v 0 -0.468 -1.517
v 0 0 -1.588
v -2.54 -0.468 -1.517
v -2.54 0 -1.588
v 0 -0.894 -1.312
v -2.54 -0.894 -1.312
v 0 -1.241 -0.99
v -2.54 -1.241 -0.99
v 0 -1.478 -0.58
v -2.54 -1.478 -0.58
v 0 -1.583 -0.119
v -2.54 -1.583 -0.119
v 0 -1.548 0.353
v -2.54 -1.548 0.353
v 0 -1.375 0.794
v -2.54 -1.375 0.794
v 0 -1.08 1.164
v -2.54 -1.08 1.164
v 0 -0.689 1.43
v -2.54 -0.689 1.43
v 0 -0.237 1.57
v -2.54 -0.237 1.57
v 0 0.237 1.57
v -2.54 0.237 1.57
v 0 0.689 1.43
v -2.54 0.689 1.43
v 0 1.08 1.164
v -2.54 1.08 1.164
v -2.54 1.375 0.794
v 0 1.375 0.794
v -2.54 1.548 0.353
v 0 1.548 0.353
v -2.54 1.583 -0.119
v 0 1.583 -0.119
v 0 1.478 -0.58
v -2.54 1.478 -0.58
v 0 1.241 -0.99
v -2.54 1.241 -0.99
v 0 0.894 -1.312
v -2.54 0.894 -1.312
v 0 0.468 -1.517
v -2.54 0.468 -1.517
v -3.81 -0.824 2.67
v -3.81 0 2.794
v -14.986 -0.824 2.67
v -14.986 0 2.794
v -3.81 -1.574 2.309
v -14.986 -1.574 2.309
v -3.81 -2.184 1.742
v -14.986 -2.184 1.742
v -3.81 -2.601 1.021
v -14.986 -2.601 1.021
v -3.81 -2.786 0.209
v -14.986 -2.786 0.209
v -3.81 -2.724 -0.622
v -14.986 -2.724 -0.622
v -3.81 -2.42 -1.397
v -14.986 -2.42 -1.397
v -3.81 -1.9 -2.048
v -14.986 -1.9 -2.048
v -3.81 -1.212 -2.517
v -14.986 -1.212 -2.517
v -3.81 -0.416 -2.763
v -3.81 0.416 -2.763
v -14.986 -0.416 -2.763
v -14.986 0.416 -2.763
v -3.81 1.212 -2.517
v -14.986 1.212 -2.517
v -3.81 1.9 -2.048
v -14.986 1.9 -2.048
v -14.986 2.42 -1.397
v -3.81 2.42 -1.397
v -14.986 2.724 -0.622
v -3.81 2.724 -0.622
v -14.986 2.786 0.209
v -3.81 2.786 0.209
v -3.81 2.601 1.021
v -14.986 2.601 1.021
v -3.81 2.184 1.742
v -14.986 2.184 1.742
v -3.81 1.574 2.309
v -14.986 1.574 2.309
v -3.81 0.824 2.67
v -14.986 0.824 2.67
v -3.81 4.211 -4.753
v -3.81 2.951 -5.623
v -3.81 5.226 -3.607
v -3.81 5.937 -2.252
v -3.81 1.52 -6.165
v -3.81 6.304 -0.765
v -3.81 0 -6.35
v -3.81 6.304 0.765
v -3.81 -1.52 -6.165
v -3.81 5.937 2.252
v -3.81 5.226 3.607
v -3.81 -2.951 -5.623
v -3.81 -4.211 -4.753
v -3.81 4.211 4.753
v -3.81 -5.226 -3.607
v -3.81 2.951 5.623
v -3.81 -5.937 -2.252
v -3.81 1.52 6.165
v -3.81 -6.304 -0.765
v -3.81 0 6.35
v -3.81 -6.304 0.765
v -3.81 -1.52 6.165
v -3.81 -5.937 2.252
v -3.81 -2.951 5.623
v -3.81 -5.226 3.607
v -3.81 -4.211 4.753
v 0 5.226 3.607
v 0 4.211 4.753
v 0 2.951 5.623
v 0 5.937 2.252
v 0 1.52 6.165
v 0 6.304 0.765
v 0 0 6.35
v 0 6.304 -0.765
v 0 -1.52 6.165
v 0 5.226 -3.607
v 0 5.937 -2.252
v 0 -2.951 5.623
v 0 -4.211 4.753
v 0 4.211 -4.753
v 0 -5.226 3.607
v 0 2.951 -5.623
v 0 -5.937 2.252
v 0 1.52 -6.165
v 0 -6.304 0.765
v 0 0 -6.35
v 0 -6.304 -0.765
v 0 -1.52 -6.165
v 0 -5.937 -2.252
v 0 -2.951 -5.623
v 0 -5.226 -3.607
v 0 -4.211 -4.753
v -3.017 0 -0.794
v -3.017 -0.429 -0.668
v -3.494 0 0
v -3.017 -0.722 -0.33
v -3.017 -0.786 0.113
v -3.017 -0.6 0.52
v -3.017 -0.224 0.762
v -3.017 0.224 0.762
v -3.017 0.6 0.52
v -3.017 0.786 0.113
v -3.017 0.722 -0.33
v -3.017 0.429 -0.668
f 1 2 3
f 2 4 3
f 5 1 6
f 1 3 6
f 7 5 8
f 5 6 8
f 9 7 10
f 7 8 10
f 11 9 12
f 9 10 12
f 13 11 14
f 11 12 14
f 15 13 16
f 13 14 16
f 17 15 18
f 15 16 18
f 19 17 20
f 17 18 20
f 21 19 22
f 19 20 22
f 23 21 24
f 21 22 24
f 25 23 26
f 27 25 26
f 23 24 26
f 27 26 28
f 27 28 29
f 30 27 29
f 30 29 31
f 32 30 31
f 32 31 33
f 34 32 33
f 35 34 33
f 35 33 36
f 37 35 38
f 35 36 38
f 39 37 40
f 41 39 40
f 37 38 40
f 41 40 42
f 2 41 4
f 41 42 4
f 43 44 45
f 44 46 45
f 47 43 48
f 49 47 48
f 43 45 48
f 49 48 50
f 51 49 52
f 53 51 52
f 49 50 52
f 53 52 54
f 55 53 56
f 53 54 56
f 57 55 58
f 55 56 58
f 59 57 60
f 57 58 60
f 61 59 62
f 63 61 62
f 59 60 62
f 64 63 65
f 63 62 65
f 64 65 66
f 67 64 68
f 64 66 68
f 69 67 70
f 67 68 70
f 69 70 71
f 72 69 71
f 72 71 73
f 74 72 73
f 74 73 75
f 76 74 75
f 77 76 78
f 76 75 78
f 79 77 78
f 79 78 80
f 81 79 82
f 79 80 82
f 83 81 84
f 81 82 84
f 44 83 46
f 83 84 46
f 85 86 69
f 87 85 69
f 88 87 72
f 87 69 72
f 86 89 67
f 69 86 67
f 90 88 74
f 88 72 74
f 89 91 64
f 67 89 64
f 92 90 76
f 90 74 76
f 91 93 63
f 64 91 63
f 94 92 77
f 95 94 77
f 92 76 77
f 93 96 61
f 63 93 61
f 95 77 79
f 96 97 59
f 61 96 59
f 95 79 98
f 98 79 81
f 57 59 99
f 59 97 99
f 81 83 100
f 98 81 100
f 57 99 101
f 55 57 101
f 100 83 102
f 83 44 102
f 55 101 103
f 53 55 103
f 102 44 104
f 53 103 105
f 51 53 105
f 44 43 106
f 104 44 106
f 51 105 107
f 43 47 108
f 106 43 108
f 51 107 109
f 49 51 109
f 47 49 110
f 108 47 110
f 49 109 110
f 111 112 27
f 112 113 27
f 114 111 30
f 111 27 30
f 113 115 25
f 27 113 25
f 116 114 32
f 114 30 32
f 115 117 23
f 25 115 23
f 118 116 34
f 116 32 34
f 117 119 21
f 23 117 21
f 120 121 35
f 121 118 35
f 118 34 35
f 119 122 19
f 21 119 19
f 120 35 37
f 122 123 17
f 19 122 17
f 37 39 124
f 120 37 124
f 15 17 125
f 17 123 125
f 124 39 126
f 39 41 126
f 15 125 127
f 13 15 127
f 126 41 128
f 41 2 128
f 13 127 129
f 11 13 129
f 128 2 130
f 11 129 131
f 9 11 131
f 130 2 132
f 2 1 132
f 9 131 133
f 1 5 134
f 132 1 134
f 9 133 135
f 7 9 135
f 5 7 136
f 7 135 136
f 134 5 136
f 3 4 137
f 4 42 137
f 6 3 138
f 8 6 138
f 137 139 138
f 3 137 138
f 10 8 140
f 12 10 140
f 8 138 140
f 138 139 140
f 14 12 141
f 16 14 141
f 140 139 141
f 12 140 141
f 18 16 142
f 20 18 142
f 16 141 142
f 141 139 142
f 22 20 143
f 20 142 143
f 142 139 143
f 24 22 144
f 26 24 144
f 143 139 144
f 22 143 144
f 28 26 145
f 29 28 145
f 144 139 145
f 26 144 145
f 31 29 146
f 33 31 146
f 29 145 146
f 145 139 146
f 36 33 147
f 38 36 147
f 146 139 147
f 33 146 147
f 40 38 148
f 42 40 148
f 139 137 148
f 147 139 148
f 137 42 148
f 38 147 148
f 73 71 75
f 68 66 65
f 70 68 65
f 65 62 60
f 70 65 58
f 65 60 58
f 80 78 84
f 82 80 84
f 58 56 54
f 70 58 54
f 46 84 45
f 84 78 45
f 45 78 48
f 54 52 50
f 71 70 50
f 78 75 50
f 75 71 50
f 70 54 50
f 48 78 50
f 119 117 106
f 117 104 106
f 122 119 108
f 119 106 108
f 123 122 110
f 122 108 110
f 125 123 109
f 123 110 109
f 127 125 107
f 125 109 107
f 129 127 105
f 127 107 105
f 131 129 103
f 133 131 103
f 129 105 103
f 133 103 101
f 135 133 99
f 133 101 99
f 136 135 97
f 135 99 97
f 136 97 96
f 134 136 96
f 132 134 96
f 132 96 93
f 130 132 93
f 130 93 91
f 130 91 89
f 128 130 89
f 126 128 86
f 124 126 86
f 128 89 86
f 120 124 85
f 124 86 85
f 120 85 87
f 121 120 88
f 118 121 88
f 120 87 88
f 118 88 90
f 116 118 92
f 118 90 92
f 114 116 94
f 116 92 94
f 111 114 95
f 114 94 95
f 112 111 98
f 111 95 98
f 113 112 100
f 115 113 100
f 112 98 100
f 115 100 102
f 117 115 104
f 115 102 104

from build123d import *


with BuildPart() as part:
    # Sketch1 → Revolve2 (revolve)
    with BuildSketch(Plane.XY, mode=Mode.PRIVATE) as revolve2_sk:
        Polygon((0, 0), (0, 6.35), (-3.81, 6.35), (-3.81, 2.794), (-14.986, 2.794), (-14.986, 0), align=None)
    revolve(revolve2_sk.sketch.rotate(Axis((-1364.978742306, 0, 0), (1, 0, 0)), 90), axis=Axis((-1364.978742306, 0, 0), (1, 0, 0)))

    # Sketch4 → Cut-Revolve1 (revolve, cut)
    with BuildSketch(Plane.XY, mode=Mode.PRIVATE) as cut_revolve1_sk:
        Polygon((0, 0), (0, 1.5875), (-2.54, 1.5875), (-3.493866233, 0), align=None)
    revolve(cut_revolve1_sk.sketch.rotate(Axis((0, 0, 0), (-1, 0, 0)), 90), axis=Axis((0, 0, 0), (-1, 0, 0)), mode=Mode.SUBTRACT)


solid = part.part
